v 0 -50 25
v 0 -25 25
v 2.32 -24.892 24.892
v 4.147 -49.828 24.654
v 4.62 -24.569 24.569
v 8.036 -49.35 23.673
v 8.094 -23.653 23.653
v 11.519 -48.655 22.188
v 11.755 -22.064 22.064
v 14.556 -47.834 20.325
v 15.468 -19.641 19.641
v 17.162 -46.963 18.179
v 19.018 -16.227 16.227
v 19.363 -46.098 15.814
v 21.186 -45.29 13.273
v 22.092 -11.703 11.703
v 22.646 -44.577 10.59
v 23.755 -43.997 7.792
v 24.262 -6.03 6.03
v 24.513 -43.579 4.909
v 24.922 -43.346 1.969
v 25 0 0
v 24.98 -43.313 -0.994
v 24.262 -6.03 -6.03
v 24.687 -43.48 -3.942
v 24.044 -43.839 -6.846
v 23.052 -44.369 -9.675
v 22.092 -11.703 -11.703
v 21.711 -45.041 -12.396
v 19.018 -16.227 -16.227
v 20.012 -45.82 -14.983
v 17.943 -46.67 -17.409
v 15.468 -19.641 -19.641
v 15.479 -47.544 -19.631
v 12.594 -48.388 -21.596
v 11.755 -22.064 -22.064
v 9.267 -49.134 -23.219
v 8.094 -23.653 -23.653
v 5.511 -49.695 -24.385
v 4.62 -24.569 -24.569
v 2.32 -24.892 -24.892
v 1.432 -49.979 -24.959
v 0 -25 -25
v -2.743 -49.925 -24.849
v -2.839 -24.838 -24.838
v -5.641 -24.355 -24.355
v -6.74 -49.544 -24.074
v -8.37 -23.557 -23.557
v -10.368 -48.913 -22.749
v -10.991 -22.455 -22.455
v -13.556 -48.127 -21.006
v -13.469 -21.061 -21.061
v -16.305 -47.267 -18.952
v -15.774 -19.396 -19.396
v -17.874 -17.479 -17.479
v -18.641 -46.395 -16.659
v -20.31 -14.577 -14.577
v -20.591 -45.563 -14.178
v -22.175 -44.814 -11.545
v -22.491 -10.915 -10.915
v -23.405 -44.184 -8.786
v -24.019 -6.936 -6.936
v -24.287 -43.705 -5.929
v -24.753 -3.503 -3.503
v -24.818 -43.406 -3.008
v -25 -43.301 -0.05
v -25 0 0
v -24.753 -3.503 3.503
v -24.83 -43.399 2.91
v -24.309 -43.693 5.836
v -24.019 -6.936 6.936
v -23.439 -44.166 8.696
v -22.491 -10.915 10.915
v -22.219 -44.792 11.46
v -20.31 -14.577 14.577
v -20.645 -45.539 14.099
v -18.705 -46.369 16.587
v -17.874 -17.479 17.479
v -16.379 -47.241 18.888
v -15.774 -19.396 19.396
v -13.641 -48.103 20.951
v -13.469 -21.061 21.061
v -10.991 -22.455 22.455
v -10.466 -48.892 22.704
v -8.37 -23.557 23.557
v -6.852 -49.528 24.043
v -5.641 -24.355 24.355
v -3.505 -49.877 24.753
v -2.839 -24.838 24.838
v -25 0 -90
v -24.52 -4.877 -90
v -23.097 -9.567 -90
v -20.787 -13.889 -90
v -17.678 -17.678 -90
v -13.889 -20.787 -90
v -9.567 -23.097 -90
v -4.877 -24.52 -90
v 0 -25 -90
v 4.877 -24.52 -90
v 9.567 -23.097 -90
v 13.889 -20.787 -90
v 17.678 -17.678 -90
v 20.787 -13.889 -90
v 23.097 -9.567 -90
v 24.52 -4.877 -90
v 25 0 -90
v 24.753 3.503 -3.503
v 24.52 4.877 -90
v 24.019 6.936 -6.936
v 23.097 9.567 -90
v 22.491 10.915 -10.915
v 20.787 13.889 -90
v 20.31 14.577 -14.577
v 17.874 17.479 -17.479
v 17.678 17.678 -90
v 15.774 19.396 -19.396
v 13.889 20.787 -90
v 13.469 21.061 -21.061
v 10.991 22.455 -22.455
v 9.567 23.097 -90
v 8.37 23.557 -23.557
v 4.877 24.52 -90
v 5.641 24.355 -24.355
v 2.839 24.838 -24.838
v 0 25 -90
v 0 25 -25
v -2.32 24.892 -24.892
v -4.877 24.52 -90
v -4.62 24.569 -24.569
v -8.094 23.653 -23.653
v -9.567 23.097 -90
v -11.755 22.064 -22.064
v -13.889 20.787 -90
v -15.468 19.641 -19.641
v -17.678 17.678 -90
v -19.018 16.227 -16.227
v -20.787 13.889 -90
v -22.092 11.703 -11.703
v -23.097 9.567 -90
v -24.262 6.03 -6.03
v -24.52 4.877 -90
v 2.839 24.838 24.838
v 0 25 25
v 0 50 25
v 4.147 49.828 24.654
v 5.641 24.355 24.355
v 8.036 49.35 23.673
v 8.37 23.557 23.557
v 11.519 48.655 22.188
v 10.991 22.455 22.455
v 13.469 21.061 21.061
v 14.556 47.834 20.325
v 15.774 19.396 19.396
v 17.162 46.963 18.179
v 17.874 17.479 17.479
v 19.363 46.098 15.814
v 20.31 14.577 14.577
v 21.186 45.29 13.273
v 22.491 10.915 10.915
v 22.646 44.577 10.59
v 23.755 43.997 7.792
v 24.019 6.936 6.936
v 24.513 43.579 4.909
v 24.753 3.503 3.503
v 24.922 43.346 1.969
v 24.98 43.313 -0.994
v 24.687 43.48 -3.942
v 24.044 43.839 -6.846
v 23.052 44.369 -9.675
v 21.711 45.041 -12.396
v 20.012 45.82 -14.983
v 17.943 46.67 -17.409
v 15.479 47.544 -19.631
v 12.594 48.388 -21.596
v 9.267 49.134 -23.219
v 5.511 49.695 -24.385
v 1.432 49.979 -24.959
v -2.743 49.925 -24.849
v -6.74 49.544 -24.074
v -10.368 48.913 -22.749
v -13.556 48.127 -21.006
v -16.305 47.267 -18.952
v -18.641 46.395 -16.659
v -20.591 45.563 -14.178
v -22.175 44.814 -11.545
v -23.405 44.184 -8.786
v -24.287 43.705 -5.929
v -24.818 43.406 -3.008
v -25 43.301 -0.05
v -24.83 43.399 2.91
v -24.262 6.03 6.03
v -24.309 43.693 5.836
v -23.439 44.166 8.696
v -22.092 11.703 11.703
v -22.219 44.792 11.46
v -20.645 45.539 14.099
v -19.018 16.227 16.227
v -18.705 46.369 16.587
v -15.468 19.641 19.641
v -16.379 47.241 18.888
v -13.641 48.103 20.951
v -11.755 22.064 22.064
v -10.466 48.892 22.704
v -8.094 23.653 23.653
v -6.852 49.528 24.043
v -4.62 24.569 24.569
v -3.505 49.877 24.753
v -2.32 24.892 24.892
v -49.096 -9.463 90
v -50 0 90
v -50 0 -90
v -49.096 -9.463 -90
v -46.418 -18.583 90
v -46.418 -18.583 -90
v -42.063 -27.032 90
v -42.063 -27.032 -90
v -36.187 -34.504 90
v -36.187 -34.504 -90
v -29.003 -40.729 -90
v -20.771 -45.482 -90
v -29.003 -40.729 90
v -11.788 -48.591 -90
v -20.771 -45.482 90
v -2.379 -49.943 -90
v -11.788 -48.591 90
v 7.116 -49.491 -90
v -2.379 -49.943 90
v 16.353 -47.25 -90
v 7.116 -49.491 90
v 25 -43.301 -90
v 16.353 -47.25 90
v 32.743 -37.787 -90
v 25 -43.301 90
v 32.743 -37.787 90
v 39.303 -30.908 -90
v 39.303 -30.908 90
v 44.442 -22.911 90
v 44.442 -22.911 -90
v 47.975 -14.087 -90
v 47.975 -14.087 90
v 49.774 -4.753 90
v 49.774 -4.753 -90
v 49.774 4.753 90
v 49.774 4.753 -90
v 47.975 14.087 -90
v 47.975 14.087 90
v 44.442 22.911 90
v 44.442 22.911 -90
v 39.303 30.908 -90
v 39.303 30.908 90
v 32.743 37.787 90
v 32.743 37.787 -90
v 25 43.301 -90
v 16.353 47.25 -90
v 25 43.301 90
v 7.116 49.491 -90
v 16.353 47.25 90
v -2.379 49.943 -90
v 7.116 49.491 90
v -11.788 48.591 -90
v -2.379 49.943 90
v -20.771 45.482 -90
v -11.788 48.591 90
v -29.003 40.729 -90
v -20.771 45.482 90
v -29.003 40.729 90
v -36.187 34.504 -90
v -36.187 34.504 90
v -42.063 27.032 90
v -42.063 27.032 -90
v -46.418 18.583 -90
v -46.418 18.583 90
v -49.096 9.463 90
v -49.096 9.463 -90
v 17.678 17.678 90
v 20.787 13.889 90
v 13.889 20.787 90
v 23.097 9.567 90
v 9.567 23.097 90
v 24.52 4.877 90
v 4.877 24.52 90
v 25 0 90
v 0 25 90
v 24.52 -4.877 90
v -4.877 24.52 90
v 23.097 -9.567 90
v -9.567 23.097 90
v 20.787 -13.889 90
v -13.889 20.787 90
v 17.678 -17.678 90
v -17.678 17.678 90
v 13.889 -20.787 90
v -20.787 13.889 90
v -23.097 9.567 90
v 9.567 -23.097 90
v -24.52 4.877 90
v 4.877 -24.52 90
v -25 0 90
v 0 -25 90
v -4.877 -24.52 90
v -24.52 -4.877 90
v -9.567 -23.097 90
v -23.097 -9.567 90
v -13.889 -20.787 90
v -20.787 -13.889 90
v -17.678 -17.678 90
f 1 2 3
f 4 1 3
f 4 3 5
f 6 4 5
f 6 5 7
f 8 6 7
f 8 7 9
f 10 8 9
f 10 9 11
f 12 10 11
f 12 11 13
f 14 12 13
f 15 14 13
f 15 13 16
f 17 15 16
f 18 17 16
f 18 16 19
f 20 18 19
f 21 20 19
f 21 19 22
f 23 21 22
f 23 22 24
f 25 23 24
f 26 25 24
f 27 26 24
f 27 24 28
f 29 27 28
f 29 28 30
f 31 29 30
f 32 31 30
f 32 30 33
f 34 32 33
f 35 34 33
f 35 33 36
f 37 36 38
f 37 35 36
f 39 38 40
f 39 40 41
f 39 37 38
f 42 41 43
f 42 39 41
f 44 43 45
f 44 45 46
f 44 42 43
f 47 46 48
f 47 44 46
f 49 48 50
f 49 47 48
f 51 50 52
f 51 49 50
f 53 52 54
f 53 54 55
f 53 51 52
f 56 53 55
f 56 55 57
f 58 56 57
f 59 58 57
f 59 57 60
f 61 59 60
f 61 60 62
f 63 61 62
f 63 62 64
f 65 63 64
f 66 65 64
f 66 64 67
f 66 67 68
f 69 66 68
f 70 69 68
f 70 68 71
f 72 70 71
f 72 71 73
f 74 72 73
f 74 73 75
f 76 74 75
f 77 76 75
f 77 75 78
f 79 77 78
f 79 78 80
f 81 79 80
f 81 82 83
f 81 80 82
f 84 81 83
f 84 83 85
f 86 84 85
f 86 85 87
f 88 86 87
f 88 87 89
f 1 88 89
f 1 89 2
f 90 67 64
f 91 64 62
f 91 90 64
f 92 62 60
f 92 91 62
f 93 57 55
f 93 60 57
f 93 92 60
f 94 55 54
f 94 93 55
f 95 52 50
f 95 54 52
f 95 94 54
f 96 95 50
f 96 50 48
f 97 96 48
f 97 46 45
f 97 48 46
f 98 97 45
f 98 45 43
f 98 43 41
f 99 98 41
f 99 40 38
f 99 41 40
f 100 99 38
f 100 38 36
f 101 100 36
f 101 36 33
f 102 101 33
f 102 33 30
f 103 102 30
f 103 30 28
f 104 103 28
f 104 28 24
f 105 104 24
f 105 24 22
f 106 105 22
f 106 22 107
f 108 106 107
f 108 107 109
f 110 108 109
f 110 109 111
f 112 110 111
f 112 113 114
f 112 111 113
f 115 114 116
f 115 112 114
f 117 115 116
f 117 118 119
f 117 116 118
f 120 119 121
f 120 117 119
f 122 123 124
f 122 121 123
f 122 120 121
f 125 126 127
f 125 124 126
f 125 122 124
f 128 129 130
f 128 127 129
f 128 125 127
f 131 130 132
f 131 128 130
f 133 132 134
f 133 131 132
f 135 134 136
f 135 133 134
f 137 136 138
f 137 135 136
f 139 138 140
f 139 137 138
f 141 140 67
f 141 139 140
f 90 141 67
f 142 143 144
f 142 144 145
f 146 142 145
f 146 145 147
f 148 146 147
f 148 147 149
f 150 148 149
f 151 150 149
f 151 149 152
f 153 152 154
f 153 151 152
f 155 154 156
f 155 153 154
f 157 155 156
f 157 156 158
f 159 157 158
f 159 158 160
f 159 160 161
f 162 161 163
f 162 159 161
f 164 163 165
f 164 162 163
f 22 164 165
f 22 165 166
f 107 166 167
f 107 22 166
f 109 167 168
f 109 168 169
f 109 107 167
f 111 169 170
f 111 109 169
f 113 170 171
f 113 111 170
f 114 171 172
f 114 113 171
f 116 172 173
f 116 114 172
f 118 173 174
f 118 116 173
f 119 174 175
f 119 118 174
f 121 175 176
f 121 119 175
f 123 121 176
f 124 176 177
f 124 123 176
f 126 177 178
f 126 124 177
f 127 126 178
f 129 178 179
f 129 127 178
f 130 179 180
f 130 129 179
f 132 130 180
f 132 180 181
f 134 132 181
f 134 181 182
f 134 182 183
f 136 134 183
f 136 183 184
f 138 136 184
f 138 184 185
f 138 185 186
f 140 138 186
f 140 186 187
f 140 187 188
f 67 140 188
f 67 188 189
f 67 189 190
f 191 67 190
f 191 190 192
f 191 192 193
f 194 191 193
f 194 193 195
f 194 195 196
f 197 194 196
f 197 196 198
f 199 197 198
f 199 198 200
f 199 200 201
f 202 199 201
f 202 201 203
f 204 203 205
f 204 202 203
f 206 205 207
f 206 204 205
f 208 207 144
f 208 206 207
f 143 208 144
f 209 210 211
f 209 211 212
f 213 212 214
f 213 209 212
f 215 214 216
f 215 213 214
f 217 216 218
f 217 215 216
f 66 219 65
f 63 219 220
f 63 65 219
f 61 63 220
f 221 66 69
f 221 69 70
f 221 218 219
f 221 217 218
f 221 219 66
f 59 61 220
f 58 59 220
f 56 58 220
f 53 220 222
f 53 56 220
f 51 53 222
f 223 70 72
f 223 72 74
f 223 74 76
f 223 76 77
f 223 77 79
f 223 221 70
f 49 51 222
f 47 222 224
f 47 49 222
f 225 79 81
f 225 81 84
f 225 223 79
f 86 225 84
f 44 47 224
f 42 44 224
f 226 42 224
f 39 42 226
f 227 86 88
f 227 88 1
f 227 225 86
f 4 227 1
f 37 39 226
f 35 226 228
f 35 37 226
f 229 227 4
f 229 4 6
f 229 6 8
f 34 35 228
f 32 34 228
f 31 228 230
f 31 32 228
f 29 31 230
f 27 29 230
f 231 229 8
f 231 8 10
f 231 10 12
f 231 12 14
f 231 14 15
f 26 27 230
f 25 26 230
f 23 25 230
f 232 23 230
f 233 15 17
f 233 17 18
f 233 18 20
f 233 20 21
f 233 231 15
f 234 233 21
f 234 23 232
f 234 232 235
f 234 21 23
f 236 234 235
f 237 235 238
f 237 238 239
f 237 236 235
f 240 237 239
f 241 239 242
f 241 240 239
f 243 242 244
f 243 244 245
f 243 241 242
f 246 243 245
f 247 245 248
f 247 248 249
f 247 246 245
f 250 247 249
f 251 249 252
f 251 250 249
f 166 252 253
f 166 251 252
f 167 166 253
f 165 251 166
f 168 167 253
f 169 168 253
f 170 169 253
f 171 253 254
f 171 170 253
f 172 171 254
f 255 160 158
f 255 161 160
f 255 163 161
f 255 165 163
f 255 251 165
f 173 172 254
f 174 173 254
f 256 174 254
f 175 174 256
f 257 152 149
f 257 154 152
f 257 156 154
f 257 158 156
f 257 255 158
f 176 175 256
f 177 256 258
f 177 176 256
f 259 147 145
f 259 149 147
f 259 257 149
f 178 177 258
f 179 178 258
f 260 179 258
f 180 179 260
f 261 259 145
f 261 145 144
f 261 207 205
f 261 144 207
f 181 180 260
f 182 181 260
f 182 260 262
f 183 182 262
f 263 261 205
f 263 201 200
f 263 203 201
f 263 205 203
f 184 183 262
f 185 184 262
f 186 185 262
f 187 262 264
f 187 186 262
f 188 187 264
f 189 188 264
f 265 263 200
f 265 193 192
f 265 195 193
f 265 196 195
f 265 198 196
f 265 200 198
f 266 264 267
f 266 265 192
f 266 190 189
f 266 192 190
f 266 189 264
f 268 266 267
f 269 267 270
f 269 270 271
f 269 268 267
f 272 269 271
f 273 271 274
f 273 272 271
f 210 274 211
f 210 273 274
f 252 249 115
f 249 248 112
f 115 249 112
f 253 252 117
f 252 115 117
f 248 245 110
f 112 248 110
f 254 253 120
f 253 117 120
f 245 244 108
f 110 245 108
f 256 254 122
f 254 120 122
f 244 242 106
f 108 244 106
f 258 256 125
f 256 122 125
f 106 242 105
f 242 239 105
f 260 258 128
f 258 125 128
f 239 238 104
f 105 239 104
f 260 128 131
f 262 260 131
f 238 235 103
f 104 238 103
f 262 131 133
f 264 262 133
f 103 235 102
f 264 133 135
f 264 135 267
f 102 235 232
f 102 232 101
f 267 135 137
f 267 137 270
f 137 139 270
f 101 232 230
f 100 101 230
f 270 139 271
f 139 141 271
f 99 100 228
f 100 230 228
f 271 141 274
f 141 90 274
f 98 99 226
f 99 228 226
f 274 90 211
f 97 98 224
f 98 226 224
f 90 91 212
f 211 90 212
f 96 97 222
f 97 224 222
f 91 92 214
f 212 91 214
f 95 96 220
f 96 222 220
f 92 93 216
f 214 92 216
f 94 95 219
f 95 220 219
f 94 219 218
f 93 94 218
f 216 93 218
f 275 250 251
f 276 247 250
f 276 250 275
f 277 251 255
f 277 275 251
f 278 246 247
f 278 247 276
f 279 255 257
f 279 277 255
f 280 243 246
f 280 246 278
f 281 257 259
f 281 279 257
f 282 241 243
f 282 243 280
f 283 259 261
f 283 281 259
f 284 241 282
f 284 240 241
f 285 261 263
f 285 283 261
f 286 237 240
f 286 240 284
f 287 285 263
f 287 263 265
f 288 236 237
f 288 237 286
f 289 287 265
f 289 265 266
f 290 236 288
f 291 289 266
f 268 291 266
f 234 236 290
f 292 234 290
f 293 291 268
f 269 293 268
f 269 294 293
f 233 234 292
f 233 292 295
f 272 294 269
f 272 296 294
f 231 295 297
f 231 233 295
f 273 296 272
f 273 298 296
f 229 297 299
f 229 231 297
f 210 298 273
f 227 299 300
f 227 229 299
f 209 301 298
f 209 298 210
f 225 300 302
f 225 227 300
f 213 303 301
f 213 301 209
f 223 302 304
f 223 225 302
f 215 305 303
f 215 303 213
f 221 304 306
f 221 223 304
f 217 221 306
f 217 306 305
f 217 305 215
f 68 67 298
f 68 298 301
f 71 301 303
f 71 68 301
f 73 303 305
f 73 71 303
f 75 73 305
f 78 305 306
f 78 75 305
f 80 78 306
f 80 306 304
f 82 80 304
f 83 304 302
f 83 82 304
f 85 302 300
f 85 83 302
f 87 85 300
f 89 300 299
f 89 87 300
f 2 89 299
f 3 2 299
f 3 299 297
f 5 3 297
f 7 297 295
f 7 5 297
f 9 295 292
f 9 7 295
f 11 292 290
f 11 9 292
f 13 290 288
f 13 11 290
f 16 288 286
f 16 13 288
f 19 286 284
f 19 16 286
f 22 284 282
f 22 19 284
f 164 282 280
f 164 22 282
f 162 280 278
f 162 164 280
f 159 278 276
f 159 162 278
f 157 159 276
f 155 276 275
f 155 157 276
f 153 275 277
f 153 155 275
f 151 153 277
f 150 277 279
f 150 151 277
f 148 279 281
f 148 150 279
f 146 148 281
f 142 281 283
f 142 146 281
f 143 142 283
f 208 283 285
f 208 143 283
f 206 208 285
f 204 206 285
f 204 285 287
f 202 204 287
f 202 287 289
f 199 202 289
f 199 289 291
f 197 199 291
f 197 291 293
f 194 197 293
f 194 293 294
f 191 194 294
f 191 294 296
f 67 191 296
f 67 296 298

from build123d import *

# Parameters (mm, degrees)
SKETCH1_R               = 50
SKETCH1_R_2             = 25
BOSS_EXTRUDE1_DEPTH     = 90
CUT_EXTRUDE1_DEPTH      = 115.455231423
CUT_EXTRUDE1_DEPTH_BACK = 115.455231423
SKETCH2_R               = 25


with BuildPart() as part:
    # Sketch1 → Boss-Extrude1 (new, symmetric)
    with BuildSketch(Plane.XY):
        with Locations(Location((0, 0, 0), (0, 0, 180))):
            Circle(SKETCH1_R)
        with Locations(Location((0, 0, 0), (0, 0, 180))):
            Circle(SKETCH1_R_2, mode=Mode.SUBTRACT)
    extrude(amount=BOSS_EXTRUDE1_DEPTH, both=True)

    # Sketch2 → Cut-Extrude1 (cut, two sides: drawn at the far end of the back side and taken through both)
    with BuildSketch(Plane(origin=(0, 0, 0), x_dir=(1, 0, 0), z_dir=(0, 1, 0)).offset(-CUT_EXTRUDE1_DEPTH_BACK)):
        with Locations(Location((0, 0, 0), (0, 0, 270))):
            Circle(SKETCH2_R)
    extrude(amount=CUT_EXTRUDE1_DEPTH + CUT_EXTRUDE1_DEPTH_BACK, mode=Mode.SUBTRACT)


solid = part.part
